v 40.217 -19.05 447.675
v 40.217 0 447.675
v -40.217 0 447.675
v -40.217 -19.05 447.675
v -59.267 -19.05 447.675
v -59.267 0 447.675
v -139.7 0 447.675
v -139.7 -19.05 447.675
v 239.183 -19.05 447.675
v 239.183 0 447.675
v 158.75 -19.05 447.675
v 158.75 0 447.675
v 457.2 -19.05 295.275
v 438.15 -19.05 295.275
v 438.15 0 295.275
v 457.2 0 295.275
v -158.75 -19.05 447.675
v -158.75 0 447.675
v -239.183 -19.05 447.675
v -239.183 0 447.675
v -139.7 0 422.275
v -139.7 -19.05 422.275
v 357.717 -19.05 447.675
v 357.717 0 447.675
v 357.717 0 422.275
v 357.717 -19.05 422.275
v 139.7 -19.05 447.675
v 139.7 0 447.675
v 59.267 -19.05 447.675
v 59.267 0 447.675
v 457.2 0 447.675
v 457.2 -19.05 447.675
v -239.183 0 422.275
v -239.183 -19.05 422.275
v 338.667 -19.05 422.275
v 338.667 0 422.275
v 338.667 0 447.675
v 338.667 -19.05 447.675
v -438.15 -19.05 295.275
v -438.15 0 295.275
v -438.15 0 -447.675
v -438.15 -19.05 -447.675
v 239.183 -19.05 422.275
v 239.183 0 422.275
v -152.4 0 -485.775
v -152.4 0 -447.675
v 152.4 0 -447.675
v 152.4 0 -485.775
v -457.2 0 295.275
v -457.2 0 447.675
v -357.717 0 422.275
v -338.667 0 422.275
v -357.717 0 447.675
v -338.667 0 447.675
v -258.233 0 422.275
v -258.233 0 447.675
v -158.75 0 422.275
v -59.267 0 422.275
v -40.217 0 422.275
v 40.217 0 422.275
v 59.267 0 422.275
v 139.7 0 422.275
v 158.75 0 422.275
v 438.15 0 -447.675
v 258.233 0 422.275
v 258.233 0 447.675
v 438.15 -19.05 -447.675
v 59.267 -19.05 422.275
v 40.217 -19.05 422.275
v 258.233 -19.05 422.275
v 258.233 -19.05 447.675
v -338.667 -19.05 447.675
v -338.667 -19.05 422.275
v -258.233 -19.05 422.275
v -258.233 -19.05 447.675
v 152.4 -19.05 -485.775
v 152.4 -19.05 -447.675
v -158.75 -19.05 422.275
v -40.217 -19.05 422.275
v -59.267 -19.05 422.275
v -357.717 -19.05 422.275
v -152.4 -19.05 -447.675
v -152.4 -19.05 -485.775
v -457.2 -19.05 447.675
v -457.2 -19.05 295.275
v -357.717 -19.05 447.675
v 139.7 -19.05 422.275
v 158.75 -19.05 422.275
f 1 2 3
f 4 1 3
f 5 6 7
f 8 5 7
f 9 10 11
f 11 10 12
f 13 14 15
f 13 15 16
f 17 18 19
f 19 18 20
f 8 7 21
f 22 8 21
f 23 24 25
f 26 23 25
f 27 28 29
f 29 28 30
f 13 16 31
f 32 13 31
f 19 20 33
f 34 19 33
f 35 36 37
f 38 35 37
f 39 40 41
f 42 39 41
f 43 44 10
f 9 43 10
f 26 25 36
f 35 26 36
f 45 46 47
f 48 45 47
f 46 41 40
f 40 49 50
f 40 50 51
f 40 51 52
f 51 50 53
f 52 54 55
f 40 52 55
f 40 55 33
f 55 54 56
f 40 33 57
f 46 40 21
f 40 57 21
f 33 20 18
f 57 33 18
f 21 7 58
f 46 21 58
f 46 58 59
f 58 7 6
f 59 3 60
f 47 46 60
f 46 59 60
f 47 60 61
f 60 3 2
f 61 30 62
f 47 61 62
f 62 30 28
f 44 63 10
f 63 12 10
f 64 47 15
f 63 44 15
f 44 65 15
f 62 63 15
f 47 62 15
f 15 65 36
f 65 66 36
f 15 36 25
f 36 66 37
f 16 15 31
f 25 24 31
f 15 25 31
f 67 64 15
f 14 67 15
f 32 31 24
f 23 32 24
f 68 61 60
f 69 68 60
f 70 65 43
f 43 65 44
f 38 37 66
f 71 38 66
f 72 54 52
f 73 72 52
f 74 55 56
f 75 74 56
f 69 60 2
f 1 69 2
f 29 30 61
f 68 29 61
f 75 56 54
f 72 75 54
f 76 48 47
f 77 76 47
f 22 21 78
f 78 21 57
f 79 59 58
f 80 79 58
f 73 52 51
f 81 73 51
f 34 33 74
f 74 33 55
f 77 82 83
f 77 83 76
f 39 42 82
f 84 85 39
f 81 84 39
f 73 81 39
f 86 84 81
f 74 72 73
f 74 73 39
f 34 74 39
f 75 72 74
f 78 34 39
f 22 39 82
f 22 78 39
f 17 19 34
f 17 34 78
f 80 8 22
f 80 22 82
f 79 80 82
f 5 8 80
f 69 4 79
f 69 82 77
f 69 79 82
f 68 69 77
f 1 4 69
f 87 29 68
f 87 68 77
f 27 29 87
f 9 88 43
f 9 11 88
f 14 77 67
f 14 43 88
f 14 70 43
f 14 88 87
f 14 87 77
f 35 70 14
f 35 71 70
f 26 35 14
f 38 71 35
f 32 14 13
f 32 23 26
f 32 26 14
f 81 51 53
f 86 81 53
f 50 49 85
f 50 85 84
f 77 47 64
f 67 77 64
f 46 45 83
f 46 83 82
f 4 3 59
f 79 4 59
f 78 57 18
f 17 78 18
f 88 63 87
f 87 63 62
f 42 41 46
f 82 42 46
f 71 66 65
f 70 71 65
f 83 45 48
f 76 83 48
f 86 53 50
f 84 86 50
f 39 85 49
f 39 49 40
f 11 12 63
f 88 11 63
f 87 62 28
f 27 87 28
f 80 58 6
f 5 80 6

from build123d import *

# Parameters (mm, degrees)
F0_W     = 19.05
F0_H     = 152.4
F0_W_2   = 304.8
F0_H_2   = 38.1
F1_DEPTH = 19.05


with BuildPart() as f1:
    # F0 (on Front) → F1 (new body)
    with BuildSketch(Plane.XZ):
        Polygon((-357.716667, 447.675), (-438.15, 447.675), (-438.15, 295.275), (-438.15, -447.675), (-152.4, -447.675), (152.4, -447.675), (438.15, -447.675), (438.15, 295.275), (438.15, 447.675), (357.716667, 447.675), (357.716667, 422.275), (338.666667, 422.275), (338.666667, 447.675), (258.233333, 447.675), (258.233333, 422.275), (239.183333, 422.275), (239.183333, 447.675), (158.75, 447.675), (158.75, 422.275), (139.7, 422.275), (139.7, 447.675), (59.266667, 447.675), (59.266667, 422.275), (40.216667, 422.275), (40.216667, 447.675), (-40.216667, 447.675), (-40.216667, 422.275), (-59.266667, 422.275), (-59.266667, 447.675), (-139.7, 447.675), (-139.7, 422.275), (-158.75, 422.275), (-158.75, 447.675), (-239.183333, 447.675), (-239.183333, 422.275), (-258.233333, 422.275), (-258.233333, 447.675), (-338.666667, 447.675), (-338.666667, 422.275), (-357.716667, 422.275), align=None)
        with Locations((-447.675, 371.475)):
            Rectangle(F0_W, F0_H)
        with Locations((0, -466.725)):
            Rectangle(F0_W_2, F0_H_2)
        with Locations((447.675, 371.475)):
            Rectangle(F0_W, F0_H)
    extrude(amount=F1_DEPTH)


solid = f1.part
